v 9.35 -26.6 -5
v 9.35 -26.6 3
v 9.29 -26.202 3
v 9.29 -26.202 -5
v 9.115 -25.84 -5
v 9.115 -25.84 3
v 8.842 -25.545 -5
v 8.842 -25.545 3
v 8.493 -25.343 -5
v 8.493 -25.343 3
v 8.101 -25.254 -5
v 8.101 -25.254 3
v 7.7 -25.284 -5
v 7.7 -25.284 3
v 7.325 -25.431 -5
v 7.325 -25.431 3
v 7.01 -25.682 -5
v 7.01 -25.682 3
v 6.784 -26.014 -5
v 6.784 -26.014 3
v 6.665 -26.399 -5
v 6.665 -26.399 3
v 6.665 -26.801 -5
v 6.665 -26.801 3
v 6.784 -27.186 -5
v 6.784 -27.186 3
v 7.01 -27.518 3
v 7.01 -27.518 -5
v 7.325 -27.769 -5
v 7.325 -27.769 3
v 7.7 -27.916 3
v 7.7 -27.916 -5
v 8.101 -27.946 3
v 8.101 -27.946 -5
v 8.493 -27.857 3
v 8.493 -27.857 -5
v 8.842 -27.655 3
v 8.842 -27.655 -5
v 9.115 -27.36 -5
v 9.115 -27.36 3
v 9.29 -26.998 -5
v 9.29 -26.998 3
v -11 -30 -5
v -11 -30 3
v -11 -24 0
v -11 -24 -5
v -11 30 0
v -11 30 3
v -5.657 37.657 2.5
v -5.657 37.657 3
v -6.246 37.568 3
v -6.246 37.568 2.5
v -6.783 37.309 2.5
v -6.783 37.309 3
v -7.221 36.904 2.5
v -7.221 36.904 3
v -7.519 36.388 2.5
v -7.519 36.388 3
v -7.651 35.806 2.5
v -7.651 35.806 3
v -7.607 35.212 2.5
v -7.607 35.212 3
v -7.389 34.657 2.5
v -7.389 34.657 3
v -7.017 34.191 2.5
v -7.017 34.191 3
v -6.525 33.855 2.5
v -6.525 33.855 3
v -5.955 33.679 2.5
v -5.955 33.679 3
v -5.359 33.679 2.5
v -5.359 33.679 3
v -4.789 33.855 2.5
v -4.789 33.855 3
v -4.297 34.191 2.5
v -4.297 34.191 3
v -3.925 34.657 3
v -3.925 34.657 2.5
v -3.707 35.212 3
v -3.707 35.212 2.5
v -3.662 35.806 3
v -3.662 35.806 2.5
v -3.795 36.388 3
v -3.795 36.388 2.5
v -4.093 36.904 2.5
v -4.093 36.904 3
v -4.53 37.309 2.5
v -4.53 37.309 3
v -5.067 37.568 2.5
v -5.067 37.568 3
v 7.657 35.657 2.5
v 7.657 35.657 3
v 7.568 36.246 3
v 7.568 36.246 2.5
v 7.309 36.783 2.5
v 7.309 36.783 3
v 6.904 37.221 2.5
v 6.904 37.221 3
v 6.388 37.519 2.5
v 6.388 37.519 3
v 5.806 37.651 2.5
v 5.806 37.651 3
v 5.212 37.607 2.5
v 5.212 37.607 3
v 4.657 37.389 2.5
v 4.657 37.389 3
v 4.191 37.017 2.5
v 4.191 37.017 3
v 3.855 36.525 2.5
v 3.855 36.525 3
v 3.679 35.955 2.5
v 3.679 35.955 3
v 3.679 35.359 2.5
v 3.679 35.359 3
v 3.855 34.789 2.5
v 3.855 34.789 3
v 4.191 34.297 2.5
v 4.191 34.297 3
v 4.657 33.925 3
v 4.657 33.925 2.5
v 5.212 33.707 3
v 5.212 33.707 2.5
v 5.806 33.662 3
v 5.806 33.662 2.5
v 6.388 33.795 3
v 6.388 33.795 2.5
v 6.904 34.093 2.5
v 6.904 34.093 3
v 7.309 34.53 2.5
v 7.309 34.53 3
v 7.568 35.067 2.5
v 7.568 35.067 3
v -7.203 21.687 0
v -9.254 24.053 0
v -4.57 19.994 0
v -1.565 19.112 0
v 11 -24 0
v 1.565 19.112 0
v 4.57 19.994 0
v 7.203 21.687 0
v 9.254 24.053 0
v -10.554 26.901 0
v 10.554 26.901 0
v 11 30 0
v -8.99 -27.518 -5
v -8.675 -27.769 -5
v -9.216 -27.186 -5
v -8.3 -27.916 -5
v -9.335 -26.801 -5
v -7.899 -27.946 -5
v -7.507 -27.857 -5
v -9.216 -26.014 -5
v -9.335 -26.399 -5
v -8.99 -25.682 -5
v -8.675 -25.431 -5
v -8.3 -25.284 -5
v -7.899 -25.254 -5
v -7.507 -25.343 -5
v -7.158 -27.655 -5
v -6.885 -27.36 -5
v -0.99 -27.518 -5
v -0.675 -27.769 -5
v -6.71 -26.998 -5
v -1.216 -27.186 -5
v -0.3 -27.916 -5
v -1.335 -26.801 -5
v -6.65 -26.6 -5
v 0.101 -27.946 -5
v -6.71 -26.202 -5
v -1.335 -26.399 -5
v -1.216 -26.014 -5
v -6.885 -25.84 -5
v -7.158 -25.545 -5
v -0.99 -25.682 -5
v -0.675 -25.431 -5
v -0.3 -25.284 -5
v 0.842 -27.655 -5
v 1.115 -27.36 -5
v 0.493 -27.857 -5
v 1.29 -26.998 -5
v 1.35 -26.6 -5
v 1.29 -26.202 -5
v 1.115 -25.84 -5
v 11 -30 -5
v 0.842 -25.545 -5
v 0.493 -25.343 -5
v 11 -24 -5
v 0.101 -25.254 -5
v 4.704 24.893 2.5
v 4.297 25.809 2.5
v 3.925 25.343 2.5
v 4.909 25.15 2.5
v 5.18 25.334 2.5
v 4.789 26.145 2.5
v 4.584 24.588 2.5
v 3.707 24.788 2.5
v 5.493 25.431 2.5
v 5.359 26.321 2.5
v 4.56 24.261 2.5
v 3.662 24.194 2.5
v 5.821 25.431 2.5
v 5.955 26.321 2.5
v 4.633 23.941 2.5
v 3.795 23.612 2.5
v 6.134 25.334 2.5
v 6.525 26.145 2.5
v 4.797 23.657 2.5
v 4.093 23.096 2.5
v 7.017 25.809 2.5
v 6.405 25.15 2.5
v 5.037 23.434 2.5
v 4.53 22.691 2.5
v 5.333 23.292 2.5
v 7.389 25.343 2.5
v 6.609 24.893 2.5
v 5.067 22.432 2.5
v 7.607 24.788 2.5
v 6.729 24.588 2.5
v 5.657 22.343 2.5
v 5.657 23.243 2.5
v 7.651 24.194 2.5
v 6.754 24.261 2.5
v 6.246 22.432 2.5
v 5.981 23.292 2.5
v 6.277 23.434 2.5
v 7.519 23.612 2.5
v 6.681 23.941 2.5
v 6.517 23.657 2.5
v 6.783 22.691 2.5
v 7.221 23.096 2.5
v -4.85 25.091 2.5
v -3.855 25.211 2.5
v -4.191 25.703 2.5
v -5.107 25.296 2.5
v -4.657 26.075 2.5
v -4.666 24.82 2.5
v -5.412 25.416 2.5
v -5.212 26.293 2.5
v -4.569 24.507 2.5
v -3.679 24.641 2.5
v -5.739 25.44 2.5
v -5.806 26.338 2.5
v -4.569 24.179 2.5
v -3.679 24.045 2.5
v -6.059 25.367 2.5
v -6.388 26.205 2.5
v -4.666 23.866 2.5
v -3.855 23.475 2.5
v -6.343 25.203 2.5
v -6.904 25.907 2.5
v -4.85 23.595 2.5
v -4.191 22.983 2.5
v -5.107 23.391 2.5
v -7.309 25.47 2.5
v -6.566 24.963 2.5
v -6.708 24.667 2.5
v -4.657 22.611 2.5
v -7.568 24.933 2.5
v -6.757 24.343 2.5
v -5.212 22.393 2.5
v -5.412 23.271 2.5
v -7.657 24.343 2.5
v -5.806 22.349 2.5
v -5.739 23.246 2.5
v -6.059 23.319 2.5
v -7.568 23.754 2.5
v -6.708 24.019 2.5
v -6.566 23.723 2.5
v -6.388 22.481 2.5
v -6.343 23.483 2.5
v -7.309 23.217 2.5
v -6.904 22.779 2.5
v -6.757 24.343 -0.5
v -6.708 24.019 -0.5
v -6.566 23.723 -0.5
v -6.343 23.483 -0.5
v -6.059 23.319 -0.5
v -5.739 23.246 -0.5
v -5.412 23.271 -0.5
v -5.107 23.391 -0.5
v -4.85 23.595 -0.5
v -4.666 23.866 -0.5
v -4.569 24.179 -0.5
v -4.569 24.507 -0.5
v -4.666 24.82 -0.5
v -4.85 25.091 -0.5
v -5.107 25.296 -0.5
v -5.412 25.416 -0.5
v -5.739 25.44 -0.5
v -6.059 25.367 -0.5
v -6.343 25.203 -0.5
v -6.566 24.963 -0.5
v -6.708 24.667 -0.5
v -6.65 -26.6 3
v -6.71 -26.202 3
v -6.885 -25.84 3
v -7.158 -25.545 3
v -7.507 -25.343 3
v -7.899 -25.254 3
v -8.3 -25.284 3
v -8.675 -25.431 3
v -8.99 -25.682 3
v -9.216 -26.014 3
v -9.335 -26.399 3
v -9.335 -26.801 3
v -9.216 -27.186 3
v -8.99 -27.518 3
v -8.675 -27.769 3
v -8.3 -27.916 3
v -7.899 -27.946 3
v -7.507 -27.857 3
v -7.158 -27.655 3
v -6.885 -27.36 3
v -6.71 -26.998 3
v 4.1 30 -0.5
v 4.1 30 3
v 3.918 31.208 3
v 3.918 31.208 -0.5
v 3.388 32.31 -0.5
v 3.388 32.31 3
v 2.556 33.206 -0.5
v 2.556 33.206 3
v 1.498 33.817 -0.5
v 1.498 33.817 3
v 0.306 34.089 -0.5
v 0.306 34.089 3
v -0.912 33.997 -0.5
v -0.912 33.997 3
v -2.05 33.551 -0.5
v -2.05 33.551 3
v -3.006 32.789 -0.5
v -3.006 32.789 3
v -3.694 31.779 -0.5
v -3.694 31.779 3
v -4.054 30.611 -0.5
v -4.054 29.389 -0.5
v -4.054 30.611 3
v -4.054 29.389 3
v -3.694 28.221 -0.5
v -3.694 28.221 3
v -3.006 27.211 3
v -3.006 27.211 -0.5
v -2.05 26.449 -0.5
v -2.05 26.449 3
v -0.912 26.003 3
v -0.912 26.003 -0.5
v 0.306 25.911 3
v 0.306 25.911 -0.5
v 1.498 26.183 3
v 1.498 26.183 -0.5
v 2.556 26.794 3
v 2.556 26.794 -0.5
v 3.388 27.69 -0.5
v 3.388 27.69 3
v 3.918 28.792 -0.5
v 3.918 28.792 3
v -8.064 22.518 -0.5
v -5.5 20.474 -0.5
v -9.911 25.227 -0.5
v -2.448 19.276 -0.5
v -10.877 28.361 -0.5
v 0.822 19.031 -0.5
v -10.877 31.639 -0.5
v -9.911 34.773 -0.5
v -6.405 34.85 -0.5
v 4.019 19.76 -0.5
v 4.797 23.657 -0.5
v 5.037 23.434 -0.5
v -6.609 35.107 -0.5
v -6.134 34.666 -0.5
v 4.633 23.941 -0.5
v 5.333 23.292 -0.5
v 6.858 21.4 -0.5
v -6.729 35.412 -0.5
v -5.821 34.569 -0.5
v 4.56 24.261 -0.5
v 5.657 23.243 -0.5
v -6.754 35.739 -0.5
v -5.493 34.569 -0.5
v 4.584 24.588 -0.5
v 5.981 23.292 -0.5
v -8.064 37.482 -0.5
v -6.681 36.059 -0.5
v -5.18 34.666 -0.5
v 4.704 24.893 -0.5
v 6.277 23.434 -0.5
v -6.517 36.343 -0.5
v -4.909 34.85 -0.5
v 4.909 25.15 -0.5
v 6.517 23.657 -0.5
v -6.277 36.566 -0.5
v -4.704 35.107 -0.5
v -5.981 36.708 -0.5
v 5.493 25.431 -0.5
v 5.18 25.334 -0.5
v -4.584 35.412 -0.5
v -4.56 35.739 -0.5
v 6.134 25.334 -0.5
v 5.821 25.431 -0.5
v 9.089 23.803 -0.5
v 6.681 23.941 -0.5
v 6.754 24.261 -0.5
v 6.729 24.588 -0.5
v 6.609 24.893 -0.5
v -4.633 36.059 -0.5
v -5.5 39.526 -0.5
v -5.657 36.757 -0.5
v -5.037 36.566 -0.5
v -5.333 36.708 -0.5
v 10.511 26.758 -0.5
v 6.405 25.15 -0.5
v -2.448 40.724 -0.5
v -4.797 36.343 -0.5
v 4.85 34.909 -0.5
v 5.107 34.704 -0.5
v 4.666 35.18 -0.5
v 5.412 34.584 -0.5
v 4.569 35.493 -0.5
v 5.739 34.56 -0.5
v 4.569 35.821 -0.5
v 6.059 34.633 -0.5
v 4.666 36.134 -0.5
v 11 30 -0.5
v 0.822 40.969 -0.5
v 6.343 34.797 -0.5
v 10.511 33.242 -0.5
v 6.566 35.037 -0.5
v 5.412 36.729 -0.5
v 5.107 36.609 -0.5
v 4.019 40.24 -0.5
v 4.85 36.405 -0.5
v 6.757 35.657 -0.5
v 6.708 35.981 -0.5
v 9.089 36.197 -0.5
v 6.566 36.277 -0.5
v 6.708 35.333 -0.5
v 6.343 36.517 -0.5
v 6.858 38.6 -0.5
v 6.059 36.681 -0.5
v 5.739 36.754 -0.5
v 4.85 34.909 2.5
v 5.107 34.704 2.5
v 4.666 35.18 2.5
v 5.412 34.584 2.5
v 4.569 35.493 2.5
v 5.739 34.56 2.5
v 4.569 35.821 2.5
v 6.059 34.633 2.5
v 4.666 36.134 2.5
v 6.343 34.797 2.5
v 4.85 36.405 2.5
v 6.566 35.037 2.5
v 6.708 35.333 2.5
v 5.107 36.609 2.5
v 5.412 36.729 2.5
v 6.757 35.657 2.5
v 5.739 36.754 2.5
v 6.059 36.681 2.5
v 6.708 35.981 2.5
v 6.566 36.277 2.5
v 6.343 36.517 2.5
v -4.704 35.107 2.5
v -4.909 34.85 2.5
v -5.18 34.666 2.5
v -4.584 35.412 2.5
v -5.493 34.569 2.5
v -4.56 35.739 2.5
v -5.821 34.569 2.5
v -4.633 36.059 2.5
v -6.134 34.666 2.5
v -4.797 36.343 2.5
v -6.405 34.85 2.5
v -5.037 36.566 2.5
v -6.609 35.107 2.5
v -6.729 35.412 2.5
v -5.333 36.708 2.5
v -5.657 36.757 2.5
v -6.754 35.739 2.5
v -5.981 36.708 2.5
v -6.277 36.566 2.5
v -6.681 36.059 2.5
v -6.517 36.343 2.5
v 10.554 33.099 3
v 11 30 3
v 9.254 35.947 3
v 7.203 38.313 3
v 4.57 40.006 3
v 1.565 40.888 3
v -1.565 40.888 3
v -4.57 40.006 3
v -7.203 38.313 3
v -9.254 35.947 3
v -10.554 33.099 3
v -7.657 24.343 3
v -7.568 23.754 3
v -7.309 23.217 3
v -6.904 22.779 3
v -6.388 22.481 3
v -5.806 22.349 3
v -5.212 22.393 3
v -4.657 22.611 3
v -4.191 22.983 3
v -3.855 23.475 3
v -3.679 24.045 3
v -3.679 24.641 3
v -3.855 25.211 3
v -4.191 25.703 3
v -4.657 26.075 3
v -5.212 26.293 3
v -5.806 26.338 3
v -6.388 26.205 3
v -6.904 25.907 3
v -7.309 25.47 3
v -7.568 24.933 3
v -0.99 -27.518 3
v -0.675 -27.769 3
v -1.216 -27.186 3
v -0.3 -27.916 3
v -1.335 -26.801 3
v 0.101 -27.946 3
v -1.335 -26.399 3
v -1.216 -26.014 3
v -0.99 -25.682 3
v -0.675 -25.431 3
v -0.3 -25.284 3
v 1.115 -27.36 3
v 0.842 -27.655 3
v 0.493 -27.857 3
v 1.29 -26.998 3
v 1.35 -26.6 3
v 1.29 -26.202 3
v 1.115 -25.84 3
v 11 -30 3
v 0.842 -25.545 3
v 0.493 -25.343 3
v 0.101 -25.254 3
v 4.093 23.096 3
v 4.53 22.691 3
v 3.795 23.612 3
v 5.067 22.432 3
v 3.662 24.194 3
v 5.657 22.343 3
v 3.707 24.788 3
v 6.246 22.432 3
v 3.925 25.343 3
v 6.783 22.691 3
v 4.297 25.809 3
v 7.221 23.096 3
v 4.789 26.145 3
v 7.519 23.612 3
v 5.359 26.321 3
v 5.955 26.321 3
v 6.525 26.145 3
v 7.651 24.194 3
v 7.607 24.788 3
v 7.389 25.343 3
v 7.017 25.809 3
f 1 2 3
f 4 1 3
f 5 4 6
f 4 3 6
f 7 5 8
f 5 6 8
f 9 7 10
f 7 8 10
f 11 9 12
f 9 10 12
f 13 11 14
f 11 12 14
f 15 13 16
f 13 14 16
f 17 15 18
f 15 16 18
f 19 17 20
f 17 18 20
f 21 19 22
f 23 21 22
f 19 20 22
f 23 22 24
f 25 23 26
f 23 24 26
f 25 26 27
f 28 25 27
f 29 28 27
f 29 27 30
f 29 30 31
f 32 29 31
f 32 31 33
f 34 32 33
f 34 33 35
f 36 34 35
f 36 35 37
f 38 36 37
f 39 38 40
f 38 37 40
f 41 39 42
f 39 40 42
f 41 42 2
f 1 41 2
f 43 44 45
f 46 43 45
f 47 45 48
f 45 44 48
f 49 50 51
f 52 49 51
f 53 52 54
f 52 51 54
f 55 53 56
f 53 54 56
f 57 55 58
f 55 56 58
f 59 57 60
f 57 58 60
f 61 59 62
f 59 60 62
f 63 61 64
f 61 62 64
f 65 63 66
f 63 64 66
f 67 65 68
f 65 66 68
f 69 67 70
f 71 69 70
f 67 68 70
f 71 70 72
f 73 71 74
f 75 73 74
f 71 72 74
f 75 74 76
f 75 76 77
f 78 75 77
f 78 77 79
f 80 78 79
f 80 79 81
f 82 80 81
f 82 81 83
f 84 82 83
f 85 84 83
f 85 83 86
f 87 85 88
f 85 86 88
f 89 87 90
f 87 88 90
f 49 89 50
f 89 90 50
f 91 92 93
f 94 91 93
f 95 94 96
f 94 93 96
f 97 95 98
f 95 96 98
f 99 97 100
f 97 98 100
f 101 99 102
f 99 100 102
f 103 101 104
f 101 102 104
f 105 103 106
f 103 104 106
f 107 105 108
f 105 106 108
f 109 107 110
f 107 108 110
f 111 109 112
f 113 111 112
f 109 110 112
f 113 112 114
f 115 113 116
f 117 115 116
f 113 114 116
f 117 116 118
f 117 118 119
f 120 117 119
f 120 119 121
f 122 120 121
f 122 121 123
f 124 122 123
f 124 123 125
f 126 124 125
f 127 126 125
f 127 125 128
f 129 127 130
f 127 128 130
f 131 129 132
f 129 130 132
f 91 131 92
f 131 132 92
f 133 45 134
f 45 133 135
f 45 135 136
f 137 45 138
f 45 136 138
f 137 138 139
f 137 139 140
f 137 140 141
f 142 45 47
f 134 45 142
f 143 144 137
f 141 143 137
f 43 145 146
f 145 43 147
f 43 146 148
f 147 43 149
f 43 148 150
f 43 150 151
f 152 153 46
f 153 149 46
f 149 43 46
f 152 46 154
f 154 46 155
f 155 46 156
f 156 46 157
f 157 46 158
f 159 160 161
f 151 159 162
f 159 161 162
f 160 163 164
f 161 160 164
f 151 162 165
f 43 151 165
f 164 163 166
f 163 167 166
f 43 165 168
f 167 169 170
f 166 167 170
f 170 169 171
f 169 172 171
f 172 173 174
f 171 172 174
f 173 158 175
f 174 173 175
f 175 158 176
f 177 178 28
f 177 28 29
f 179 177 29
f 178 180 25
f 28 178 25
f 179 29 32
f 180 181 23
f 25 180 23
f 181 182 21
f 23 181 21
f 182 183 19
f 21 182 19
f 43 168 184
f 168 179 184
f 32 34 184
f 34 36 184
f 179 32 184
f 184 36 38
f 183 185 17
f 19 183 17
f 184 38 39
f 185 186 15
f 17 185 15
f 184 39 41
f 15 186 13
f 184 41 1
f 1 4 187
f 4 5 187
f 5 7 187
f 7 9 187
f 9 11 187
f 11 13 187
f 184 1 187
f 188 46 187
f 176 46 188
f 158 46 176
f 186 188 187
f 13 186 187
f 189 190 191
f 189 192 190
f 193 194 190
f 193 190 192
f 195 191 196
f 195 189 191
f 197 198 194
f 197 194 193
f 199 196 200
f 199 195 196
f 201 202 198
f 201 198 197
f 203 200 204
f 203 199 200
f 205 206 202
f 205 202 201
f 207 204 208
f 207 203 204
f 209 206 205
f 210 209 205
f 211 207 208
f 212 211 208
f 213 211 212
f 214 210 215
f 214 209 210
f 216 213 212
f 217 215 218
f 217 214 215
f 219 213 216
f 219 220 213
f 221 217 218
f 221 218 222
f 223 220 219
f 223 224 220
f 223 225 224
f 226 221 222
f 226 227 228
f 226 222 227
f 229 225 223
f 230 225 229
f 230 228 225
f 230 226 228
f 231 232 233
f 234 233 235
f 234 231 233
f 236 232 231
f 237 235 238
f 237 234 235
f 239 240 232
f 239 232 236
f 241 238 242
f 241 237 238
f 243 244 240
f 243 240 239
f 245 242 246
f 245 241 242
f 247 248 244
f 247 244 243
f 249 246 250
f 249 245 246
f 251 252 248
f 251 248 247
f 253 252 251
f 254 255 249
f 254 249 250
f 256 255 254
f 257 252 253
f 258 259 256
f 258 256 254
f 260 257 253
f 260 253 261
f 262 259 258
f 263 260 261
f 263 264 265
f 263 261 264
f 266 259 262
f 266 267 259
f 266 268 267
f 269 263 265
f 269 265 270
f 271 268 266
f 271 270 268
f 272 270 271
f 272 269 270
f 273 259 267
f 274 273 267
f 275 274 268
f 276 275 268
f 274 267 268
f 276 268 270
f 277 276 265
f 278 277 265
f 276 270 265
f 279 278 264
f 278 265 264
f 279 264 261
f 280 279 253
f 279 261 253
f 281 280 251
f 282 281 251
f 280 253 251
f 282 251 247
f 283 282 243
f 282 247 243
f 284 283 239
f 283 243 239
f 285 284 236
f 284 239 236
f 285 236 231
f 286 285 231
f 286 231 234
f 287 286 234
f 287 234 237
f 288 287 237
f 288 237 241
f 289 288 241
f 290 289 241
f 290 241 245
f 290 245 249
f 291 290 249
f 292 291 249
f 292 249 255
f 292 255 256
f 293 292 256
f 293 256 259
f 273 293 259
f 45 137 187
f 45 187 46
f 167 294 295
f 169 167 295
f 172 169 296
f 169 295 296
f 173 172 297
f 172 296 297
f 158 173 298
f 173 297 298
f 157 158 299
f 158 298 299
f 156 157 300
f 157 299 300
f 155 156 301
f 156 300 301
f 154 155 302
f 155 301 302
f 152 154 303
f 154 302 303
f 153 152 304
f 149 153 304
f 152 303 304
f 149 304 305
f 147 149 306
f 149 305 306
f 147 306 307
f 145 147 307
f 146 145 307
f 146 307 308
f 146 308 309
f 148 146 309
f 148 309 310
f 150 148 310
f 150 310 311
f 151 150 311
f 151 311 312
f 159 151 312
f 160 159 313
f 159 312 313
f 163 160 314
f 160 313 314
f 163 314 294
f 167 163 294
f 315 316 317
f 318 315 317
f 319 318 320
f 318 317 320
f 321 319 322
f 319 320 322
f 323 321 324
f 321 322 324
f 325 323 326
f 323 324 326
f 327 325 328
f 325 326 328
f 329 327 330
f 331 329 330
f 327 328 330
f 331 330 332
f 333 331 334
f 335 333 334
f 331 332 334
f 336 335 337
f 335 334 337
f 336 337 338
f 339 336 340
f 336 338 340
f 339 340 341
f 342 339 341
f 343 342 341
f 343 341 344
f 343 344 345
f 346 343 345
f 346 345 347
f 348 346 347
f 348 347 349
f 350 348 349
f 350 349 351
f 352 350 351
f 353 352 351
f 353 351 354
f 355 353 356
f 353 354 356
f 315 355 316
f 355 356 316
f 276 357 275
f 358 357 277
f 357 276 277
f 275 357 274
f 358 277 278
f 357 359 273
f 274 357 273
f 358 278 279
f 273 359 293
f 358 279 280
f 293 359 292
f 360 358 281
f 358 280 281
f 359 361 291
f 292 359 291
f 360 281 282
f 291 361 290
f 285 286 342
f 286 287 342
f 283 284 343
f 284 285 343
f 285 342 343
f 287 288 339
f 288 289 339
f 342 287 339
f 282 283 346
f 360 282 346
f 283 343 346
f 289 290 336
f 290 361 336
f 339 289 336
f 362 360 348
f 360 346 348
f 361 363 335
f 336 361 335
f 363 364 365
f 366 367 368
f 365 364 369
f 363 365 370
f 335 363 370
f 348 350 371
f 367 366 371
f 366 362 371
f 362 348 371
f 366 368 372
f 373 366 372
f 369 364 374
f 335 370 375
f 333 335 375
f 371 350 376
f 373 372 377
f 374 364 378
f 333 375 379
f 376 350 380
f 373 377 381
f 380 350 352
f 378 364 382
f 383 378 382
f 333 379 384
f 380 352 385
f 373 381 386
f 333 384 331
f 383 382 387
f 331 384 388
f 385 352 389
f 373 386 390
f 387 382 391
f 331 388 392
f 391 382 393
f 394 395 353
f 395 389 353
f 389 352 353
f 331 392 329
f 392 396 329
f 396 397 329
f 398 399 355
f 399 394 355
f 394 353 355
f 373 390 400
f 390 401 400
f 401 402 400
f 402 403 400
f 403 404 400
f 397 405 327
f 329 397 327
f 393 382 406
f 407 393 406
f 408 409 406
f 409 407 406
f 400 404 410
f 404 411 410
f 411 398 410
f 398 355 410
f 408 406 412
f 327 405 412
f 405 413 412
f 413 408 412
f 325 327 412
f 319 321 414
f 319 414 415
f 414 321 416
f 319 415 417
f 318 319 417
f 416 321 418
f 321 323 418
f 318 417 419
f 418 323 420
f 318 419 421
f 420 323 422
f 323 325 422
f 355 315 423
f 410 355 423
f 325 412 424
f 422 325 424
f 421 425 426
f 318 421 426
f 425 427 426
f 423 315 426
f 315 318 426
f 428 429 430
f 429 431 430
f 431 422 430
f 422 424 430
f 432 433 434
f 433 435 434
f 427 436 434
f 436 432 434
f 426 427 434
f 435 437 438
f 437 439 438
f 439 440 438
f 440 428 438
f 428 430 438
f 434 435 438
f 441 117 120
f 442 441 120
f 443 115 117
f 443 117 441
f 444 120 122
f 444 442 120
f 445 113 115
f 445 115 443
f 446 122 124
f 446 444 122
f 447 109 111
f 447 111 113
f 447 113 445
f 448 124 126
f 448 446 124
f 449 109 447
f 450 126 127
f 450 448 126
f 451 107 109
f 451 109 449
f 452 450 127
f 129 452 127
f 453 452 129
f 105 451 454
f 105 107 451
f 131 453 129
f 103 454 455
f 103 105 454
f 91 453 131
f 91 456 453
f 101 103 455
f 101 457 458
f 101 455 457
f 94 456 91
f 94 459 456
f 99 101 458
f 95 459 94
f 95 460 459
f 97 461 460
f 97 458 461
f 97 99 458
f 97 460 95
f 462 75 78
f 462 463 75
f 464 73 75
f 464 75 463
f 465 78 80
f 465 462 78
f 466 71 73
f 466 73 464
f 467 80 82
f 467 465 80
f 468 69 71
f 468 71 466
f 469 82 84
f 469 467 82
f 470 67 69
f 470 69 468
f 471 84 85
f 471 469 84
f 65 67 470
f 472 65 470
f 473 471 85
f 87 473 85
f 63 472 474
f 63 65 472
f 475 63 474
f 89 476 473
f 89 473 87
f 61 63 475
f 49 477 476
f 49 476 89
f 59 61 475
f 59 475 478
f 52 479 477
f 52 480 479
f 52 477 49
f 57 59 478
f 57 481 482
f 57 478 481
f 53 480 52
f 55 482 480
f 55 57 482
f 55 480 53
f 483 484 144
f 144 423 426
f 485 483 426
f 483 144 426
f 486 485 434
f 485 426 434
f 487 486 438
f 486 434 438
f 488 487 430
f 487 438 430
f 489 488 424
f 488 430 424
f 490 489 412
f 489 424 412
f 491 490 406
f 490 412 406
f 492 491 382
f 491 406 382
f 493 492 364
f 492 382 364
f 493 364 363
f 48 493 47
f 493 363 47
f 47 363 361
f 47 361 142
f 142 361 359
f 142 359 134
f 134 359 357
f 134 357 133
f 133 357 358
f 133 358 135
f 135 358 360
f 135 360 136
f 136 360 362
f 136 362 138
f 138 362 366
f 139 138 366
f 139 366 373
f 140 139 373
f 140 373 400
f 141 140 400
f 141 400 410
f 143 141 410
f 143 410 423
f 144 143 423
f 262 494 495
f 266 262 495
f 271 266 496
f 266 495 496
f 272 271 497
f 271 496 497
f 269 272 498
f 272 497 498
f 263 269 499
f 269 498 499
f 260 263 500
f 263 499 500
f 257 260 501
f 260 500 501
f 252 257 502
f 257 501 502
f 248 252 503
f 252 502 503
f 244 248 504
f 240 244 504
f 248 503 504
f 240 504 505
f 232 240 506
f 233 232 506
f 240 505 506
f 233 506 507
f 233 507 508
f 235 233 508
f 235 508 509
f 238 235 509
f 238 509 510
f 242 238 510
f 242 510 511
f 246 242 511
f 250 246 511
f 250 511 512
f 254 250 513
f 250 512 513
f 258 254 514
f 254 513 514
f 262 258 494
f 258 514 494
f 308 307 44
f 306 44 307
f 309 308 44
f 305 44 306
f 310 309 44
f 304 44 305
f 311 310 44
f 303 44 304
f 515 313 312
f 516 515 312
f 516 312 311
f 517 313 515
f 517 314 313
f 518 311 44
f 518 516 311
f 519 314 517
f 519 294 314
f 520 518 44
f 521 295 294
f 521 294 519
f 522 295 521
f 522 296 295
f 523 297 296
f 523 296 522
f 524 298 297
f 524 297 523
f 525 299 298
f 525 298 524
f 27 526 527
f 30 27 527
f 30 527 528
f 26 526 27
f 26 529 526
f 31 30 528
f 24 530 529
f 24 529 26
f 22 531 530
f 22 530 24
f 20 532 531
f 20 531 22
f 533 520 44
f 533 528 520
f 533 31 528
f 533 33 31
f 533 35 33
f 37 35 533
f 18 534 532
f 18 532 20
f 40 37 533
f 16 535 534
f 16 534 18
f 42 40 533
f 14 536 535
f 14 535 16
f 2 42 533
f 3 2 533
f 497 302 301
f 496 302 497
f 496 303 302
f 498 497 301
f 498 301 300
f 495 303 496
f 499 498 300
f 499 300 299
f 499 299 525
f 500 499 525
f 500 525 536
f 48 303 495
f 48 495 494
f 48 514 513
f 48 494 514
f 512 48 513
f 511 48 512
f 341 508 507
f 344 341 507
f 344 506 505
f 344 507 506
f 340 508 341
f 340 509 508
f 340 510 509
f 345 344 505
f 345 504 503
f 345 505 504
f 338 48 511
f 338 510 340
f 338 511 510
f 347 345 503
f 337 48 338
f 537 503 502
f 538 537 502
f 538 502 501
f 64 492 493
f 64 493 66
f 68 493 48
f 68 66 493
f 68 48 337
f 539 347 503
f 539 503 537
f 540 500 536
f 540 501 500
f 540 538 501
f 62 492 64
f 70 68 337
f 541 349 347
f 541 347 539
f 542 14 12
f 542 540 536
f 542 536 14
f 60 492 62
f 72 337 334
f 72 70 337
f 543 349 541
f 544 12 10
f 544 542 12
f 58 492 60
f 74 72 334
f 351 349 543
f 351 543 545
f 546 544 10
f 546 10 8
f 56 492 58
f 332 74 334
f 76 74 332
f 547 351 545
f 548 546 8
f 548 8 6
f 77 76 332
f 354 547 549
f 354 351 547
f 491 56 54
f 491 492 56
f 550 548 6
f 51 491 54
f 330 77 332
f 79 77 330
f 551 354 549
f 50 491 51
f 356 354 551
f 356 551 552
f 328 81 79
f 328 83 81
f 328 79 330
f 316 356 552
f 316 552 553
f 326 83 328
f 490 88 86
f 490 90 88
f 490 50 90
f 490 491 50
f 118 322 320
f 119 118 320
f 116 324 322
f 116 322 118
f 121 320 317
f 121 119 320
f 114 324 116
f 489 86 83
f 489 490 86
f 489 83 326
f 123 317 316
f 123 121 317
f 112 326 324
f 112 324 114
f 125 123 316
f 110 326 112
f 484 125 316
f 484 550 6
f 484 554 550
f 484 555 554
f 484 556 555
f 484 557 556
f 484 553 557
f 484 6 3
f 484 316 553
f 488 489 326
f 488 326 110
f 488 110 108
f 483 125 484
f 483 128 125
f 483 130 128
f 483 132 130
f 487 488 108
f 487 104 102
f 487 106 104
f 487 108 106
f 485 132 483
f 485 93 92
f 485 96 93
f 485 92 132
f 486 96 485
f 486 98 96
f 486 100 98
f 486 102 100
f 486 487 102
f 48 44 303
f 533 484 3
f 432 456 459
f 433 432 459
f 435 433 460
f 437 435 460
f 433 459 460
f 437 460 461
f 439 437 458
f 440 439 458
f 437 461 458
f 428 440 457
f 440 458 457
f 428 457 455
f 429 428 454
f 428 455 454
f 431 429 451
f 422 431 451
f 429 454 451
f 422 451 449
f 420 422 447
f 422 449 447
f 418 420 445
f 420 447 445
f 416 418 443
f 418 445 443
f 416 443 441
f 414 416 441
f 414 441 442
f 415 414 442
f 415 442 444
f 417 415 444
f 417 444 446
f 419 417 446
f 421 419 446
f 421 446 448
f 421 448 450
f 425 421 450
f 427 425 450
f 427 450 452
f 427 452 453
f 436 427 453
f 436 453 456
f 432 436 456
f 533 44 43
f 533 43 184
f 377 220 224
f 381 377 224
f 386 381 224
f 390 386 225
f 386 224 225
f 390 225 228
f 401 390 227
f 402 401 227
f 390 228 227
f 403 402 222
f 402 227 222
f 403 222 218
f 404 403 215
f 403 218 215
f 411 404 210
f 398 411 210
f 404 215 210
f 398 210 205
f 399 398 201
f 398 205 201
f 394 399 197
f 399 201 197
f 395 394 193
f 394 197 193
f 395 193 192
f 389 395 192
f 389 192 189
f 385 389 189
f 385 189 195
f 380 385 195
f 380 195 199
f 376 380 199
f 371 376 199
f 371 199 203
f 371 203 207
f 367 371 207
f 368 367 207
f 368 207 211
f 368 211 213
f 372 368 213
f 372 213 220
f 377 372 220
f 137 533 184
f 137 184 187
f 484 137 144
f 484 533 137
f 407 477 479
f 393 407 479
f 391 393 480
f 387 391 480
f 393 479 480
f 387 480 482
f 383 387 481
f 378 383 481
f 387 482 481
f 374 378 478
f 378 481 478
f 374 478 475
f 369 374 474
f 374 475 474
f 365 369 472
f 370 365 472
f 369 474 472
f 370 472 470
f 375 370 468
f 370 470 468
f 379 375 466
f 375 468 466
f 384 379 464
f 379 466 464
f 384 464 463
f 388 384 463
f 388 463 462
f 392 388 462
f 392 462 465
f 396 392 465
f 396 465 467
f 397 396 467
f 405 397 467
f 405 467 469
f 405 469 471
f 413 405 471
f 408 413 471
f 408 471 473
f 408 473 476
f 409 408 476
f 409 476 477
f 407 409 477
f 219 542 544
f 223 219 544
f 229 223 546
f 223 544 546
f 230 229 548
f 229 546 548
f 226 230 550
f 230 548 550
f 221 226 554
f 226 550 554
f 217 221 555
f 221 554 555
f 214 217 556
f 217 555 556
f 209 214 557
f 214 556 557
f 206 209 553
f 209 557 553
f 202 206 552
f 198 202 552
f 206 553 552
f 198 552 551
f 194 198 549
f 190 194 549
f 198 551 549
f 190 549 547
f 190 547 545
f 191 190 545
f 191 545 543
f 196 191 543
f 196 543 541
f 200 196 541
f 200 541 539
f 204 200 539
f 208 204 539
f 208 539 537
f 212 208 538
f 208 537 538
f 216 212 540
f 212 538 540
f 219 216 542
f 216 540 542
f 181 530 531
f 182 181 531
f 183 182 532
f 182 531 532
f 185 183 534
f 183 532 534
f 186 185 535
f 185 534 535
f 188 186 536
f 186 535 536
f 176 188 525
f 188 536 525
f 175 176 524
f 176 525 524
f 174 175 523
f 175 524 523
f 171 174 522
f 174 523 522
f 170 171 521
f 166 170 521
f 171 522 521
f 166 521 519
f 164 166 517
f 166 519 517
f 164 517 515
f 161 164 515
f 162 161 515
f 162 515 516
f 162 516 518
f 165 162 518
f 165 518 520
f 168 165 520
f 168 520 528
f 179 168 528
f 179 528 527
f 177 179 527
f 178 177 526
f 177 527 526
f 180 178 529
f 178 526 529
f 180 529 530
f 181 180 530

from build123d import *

# Parameters (mm, degrees)
BOSS_EXTRUDE1_DEPTH = 3
BOSS_EXTRUDE2_START = -0.5
SKETCH1_3_R         = 11
BOSS_EXTRUDE2_DEPTH = 0.5
SKETCH2_R           = 4.1
SKETCH2_R_2         = 1.1
CUT_EXTRUDE1_DEPTH  = 3.5
SKETCH2_3_R         = 2
CUT_EXTRUDE2_DEPTH  = 0.5
CIRPATTERN2_COUNT   = 4
SKETCH1_6_W         = 11
SKETCH1_6_H         = 6
BOSS_EXTRUDE3_DEPTH = 5
SKETCH4_R           = 1.35
CUT_EXTRUDE4_DEPTH  = 8
LPATTERN2_COUNT     = 2
LPATTERN2_PITCH     = 8
LPATTERN2_COL_COUNT = 2
LPATTERN2_COL_PITCH = 8


with BuildPart() as part:
    # Sketch1 → Boss-Extrude1 (new body)
    with BuildSketch(Plane.XY):
        with BuildLine():
            Line((-11, 30), (-11, -30))
            Line((-11, -30), (11, -30))
            Line((11, -30), (11, 30))
            ThreePointArc((11, 30), (0, 41), (-11, 30))
        make_face()
    extrude(amount=BOSS_EXTRUDE1_DEPTH)

    # Sketch1<3> → Boss-Extrude2 (add)
    with BuildSketch(Plane.XY.offset(BOSS_EXTRUDE2_START)):
        with Locations((0, 30)):
            Circle(SKETCH1_3_R)
    extrude(amount=BOSS_EXTRUDE2_DEPTH)

    # Sketch2 → Cut-Extrude1 (cut)
    with BuildSketch(Plane.XY.offset(3)):
        with Locations((0, 30)):
            Circle(SKETCH2_R)
        with Locations((5.656854249, 35.656854249)):
            Circle(SKETCH2_R_2)
    cut_extrude1 = extrude(amount=-CUT_EXTRUDE1_DEPTH, mode=Mode.SUBTRACT)

    # Sketch2<3> → Cut-Extrude2 (cut)
    with BuildSketch(Plane.XY.offset(3)):
        with Locations((5.656854249, 35.656854249)):
            Circle(SKETCH2_3_R)
    cut_extrude2 = extrude(amount=-CUT_EXTRUDE2_DEPTH, mode=Mode.SUBTRACT)

    # CirPattern2: Cut-Extrude1, Cut-Extrude2 ×4 about axis
    cirpattern2_axis = Axis((0, 30, 0), (0, 0, 1))
    add([cut_extrude1.rotate(cirpattern2_axis, i * 360 / CIRPATTERN2_COUNT) for i in range(1, CIRPATTERN2_COUNT)], mode=Mode.SUBTRACT)
    add([cut_extrude2.rotate(cirpattern2_axis, i * 360 / CIRPATTERN2_COUNT) for i in range(1, CIRPATTERN2_COUNT)], mode=Mode.SUBTRACT)

    # Sketch1<6> → Boss-Extrude3 (add)
    with BuildSketch(Plane.XY):
        with Locations((-5.5, -27)):
            Rectangle(SKETCH1_6_W, SKETCH1_6_H)
        with Locations((5.5, -27)):
            Rectangle(SKETCH1_6_W, SKETCH1_6_H)
    extrude(amount=-BOSS_EXTRUDE3_DEPTH)

    # Sketch4 → Cut-Extrude4 (cut)
    with BuildSketch(Plane.XY.offset(3)):
        with Locations((0, -26.6)):
            Circle(SKETCH4_R)
    cut_extrude4 = extrude(amount=-CUT_EXTRUDE4_DEPTH, mode=Mode.SUBTRACT)

    # LPattern2: Cut-Extrude4 ×2
    with Locations(*[(i * LPATTERN2_PITCH, 0, 0) for i in range(1, LPATTERN2_COUNT)]):
        add(cut_extrude4, mode=Mode.SUBTRACT)

    # LPattern2 col: Cut-Extrude4 ×2
    with Locations(*[(-i * LPATTERN2_COL_PITCH, 0, 0) for i in range(1, LPATTERN2_COL_COUNT)]):
        add(cut_extrude4, mode=Mode.SUBTRACT)


solid = part.part
